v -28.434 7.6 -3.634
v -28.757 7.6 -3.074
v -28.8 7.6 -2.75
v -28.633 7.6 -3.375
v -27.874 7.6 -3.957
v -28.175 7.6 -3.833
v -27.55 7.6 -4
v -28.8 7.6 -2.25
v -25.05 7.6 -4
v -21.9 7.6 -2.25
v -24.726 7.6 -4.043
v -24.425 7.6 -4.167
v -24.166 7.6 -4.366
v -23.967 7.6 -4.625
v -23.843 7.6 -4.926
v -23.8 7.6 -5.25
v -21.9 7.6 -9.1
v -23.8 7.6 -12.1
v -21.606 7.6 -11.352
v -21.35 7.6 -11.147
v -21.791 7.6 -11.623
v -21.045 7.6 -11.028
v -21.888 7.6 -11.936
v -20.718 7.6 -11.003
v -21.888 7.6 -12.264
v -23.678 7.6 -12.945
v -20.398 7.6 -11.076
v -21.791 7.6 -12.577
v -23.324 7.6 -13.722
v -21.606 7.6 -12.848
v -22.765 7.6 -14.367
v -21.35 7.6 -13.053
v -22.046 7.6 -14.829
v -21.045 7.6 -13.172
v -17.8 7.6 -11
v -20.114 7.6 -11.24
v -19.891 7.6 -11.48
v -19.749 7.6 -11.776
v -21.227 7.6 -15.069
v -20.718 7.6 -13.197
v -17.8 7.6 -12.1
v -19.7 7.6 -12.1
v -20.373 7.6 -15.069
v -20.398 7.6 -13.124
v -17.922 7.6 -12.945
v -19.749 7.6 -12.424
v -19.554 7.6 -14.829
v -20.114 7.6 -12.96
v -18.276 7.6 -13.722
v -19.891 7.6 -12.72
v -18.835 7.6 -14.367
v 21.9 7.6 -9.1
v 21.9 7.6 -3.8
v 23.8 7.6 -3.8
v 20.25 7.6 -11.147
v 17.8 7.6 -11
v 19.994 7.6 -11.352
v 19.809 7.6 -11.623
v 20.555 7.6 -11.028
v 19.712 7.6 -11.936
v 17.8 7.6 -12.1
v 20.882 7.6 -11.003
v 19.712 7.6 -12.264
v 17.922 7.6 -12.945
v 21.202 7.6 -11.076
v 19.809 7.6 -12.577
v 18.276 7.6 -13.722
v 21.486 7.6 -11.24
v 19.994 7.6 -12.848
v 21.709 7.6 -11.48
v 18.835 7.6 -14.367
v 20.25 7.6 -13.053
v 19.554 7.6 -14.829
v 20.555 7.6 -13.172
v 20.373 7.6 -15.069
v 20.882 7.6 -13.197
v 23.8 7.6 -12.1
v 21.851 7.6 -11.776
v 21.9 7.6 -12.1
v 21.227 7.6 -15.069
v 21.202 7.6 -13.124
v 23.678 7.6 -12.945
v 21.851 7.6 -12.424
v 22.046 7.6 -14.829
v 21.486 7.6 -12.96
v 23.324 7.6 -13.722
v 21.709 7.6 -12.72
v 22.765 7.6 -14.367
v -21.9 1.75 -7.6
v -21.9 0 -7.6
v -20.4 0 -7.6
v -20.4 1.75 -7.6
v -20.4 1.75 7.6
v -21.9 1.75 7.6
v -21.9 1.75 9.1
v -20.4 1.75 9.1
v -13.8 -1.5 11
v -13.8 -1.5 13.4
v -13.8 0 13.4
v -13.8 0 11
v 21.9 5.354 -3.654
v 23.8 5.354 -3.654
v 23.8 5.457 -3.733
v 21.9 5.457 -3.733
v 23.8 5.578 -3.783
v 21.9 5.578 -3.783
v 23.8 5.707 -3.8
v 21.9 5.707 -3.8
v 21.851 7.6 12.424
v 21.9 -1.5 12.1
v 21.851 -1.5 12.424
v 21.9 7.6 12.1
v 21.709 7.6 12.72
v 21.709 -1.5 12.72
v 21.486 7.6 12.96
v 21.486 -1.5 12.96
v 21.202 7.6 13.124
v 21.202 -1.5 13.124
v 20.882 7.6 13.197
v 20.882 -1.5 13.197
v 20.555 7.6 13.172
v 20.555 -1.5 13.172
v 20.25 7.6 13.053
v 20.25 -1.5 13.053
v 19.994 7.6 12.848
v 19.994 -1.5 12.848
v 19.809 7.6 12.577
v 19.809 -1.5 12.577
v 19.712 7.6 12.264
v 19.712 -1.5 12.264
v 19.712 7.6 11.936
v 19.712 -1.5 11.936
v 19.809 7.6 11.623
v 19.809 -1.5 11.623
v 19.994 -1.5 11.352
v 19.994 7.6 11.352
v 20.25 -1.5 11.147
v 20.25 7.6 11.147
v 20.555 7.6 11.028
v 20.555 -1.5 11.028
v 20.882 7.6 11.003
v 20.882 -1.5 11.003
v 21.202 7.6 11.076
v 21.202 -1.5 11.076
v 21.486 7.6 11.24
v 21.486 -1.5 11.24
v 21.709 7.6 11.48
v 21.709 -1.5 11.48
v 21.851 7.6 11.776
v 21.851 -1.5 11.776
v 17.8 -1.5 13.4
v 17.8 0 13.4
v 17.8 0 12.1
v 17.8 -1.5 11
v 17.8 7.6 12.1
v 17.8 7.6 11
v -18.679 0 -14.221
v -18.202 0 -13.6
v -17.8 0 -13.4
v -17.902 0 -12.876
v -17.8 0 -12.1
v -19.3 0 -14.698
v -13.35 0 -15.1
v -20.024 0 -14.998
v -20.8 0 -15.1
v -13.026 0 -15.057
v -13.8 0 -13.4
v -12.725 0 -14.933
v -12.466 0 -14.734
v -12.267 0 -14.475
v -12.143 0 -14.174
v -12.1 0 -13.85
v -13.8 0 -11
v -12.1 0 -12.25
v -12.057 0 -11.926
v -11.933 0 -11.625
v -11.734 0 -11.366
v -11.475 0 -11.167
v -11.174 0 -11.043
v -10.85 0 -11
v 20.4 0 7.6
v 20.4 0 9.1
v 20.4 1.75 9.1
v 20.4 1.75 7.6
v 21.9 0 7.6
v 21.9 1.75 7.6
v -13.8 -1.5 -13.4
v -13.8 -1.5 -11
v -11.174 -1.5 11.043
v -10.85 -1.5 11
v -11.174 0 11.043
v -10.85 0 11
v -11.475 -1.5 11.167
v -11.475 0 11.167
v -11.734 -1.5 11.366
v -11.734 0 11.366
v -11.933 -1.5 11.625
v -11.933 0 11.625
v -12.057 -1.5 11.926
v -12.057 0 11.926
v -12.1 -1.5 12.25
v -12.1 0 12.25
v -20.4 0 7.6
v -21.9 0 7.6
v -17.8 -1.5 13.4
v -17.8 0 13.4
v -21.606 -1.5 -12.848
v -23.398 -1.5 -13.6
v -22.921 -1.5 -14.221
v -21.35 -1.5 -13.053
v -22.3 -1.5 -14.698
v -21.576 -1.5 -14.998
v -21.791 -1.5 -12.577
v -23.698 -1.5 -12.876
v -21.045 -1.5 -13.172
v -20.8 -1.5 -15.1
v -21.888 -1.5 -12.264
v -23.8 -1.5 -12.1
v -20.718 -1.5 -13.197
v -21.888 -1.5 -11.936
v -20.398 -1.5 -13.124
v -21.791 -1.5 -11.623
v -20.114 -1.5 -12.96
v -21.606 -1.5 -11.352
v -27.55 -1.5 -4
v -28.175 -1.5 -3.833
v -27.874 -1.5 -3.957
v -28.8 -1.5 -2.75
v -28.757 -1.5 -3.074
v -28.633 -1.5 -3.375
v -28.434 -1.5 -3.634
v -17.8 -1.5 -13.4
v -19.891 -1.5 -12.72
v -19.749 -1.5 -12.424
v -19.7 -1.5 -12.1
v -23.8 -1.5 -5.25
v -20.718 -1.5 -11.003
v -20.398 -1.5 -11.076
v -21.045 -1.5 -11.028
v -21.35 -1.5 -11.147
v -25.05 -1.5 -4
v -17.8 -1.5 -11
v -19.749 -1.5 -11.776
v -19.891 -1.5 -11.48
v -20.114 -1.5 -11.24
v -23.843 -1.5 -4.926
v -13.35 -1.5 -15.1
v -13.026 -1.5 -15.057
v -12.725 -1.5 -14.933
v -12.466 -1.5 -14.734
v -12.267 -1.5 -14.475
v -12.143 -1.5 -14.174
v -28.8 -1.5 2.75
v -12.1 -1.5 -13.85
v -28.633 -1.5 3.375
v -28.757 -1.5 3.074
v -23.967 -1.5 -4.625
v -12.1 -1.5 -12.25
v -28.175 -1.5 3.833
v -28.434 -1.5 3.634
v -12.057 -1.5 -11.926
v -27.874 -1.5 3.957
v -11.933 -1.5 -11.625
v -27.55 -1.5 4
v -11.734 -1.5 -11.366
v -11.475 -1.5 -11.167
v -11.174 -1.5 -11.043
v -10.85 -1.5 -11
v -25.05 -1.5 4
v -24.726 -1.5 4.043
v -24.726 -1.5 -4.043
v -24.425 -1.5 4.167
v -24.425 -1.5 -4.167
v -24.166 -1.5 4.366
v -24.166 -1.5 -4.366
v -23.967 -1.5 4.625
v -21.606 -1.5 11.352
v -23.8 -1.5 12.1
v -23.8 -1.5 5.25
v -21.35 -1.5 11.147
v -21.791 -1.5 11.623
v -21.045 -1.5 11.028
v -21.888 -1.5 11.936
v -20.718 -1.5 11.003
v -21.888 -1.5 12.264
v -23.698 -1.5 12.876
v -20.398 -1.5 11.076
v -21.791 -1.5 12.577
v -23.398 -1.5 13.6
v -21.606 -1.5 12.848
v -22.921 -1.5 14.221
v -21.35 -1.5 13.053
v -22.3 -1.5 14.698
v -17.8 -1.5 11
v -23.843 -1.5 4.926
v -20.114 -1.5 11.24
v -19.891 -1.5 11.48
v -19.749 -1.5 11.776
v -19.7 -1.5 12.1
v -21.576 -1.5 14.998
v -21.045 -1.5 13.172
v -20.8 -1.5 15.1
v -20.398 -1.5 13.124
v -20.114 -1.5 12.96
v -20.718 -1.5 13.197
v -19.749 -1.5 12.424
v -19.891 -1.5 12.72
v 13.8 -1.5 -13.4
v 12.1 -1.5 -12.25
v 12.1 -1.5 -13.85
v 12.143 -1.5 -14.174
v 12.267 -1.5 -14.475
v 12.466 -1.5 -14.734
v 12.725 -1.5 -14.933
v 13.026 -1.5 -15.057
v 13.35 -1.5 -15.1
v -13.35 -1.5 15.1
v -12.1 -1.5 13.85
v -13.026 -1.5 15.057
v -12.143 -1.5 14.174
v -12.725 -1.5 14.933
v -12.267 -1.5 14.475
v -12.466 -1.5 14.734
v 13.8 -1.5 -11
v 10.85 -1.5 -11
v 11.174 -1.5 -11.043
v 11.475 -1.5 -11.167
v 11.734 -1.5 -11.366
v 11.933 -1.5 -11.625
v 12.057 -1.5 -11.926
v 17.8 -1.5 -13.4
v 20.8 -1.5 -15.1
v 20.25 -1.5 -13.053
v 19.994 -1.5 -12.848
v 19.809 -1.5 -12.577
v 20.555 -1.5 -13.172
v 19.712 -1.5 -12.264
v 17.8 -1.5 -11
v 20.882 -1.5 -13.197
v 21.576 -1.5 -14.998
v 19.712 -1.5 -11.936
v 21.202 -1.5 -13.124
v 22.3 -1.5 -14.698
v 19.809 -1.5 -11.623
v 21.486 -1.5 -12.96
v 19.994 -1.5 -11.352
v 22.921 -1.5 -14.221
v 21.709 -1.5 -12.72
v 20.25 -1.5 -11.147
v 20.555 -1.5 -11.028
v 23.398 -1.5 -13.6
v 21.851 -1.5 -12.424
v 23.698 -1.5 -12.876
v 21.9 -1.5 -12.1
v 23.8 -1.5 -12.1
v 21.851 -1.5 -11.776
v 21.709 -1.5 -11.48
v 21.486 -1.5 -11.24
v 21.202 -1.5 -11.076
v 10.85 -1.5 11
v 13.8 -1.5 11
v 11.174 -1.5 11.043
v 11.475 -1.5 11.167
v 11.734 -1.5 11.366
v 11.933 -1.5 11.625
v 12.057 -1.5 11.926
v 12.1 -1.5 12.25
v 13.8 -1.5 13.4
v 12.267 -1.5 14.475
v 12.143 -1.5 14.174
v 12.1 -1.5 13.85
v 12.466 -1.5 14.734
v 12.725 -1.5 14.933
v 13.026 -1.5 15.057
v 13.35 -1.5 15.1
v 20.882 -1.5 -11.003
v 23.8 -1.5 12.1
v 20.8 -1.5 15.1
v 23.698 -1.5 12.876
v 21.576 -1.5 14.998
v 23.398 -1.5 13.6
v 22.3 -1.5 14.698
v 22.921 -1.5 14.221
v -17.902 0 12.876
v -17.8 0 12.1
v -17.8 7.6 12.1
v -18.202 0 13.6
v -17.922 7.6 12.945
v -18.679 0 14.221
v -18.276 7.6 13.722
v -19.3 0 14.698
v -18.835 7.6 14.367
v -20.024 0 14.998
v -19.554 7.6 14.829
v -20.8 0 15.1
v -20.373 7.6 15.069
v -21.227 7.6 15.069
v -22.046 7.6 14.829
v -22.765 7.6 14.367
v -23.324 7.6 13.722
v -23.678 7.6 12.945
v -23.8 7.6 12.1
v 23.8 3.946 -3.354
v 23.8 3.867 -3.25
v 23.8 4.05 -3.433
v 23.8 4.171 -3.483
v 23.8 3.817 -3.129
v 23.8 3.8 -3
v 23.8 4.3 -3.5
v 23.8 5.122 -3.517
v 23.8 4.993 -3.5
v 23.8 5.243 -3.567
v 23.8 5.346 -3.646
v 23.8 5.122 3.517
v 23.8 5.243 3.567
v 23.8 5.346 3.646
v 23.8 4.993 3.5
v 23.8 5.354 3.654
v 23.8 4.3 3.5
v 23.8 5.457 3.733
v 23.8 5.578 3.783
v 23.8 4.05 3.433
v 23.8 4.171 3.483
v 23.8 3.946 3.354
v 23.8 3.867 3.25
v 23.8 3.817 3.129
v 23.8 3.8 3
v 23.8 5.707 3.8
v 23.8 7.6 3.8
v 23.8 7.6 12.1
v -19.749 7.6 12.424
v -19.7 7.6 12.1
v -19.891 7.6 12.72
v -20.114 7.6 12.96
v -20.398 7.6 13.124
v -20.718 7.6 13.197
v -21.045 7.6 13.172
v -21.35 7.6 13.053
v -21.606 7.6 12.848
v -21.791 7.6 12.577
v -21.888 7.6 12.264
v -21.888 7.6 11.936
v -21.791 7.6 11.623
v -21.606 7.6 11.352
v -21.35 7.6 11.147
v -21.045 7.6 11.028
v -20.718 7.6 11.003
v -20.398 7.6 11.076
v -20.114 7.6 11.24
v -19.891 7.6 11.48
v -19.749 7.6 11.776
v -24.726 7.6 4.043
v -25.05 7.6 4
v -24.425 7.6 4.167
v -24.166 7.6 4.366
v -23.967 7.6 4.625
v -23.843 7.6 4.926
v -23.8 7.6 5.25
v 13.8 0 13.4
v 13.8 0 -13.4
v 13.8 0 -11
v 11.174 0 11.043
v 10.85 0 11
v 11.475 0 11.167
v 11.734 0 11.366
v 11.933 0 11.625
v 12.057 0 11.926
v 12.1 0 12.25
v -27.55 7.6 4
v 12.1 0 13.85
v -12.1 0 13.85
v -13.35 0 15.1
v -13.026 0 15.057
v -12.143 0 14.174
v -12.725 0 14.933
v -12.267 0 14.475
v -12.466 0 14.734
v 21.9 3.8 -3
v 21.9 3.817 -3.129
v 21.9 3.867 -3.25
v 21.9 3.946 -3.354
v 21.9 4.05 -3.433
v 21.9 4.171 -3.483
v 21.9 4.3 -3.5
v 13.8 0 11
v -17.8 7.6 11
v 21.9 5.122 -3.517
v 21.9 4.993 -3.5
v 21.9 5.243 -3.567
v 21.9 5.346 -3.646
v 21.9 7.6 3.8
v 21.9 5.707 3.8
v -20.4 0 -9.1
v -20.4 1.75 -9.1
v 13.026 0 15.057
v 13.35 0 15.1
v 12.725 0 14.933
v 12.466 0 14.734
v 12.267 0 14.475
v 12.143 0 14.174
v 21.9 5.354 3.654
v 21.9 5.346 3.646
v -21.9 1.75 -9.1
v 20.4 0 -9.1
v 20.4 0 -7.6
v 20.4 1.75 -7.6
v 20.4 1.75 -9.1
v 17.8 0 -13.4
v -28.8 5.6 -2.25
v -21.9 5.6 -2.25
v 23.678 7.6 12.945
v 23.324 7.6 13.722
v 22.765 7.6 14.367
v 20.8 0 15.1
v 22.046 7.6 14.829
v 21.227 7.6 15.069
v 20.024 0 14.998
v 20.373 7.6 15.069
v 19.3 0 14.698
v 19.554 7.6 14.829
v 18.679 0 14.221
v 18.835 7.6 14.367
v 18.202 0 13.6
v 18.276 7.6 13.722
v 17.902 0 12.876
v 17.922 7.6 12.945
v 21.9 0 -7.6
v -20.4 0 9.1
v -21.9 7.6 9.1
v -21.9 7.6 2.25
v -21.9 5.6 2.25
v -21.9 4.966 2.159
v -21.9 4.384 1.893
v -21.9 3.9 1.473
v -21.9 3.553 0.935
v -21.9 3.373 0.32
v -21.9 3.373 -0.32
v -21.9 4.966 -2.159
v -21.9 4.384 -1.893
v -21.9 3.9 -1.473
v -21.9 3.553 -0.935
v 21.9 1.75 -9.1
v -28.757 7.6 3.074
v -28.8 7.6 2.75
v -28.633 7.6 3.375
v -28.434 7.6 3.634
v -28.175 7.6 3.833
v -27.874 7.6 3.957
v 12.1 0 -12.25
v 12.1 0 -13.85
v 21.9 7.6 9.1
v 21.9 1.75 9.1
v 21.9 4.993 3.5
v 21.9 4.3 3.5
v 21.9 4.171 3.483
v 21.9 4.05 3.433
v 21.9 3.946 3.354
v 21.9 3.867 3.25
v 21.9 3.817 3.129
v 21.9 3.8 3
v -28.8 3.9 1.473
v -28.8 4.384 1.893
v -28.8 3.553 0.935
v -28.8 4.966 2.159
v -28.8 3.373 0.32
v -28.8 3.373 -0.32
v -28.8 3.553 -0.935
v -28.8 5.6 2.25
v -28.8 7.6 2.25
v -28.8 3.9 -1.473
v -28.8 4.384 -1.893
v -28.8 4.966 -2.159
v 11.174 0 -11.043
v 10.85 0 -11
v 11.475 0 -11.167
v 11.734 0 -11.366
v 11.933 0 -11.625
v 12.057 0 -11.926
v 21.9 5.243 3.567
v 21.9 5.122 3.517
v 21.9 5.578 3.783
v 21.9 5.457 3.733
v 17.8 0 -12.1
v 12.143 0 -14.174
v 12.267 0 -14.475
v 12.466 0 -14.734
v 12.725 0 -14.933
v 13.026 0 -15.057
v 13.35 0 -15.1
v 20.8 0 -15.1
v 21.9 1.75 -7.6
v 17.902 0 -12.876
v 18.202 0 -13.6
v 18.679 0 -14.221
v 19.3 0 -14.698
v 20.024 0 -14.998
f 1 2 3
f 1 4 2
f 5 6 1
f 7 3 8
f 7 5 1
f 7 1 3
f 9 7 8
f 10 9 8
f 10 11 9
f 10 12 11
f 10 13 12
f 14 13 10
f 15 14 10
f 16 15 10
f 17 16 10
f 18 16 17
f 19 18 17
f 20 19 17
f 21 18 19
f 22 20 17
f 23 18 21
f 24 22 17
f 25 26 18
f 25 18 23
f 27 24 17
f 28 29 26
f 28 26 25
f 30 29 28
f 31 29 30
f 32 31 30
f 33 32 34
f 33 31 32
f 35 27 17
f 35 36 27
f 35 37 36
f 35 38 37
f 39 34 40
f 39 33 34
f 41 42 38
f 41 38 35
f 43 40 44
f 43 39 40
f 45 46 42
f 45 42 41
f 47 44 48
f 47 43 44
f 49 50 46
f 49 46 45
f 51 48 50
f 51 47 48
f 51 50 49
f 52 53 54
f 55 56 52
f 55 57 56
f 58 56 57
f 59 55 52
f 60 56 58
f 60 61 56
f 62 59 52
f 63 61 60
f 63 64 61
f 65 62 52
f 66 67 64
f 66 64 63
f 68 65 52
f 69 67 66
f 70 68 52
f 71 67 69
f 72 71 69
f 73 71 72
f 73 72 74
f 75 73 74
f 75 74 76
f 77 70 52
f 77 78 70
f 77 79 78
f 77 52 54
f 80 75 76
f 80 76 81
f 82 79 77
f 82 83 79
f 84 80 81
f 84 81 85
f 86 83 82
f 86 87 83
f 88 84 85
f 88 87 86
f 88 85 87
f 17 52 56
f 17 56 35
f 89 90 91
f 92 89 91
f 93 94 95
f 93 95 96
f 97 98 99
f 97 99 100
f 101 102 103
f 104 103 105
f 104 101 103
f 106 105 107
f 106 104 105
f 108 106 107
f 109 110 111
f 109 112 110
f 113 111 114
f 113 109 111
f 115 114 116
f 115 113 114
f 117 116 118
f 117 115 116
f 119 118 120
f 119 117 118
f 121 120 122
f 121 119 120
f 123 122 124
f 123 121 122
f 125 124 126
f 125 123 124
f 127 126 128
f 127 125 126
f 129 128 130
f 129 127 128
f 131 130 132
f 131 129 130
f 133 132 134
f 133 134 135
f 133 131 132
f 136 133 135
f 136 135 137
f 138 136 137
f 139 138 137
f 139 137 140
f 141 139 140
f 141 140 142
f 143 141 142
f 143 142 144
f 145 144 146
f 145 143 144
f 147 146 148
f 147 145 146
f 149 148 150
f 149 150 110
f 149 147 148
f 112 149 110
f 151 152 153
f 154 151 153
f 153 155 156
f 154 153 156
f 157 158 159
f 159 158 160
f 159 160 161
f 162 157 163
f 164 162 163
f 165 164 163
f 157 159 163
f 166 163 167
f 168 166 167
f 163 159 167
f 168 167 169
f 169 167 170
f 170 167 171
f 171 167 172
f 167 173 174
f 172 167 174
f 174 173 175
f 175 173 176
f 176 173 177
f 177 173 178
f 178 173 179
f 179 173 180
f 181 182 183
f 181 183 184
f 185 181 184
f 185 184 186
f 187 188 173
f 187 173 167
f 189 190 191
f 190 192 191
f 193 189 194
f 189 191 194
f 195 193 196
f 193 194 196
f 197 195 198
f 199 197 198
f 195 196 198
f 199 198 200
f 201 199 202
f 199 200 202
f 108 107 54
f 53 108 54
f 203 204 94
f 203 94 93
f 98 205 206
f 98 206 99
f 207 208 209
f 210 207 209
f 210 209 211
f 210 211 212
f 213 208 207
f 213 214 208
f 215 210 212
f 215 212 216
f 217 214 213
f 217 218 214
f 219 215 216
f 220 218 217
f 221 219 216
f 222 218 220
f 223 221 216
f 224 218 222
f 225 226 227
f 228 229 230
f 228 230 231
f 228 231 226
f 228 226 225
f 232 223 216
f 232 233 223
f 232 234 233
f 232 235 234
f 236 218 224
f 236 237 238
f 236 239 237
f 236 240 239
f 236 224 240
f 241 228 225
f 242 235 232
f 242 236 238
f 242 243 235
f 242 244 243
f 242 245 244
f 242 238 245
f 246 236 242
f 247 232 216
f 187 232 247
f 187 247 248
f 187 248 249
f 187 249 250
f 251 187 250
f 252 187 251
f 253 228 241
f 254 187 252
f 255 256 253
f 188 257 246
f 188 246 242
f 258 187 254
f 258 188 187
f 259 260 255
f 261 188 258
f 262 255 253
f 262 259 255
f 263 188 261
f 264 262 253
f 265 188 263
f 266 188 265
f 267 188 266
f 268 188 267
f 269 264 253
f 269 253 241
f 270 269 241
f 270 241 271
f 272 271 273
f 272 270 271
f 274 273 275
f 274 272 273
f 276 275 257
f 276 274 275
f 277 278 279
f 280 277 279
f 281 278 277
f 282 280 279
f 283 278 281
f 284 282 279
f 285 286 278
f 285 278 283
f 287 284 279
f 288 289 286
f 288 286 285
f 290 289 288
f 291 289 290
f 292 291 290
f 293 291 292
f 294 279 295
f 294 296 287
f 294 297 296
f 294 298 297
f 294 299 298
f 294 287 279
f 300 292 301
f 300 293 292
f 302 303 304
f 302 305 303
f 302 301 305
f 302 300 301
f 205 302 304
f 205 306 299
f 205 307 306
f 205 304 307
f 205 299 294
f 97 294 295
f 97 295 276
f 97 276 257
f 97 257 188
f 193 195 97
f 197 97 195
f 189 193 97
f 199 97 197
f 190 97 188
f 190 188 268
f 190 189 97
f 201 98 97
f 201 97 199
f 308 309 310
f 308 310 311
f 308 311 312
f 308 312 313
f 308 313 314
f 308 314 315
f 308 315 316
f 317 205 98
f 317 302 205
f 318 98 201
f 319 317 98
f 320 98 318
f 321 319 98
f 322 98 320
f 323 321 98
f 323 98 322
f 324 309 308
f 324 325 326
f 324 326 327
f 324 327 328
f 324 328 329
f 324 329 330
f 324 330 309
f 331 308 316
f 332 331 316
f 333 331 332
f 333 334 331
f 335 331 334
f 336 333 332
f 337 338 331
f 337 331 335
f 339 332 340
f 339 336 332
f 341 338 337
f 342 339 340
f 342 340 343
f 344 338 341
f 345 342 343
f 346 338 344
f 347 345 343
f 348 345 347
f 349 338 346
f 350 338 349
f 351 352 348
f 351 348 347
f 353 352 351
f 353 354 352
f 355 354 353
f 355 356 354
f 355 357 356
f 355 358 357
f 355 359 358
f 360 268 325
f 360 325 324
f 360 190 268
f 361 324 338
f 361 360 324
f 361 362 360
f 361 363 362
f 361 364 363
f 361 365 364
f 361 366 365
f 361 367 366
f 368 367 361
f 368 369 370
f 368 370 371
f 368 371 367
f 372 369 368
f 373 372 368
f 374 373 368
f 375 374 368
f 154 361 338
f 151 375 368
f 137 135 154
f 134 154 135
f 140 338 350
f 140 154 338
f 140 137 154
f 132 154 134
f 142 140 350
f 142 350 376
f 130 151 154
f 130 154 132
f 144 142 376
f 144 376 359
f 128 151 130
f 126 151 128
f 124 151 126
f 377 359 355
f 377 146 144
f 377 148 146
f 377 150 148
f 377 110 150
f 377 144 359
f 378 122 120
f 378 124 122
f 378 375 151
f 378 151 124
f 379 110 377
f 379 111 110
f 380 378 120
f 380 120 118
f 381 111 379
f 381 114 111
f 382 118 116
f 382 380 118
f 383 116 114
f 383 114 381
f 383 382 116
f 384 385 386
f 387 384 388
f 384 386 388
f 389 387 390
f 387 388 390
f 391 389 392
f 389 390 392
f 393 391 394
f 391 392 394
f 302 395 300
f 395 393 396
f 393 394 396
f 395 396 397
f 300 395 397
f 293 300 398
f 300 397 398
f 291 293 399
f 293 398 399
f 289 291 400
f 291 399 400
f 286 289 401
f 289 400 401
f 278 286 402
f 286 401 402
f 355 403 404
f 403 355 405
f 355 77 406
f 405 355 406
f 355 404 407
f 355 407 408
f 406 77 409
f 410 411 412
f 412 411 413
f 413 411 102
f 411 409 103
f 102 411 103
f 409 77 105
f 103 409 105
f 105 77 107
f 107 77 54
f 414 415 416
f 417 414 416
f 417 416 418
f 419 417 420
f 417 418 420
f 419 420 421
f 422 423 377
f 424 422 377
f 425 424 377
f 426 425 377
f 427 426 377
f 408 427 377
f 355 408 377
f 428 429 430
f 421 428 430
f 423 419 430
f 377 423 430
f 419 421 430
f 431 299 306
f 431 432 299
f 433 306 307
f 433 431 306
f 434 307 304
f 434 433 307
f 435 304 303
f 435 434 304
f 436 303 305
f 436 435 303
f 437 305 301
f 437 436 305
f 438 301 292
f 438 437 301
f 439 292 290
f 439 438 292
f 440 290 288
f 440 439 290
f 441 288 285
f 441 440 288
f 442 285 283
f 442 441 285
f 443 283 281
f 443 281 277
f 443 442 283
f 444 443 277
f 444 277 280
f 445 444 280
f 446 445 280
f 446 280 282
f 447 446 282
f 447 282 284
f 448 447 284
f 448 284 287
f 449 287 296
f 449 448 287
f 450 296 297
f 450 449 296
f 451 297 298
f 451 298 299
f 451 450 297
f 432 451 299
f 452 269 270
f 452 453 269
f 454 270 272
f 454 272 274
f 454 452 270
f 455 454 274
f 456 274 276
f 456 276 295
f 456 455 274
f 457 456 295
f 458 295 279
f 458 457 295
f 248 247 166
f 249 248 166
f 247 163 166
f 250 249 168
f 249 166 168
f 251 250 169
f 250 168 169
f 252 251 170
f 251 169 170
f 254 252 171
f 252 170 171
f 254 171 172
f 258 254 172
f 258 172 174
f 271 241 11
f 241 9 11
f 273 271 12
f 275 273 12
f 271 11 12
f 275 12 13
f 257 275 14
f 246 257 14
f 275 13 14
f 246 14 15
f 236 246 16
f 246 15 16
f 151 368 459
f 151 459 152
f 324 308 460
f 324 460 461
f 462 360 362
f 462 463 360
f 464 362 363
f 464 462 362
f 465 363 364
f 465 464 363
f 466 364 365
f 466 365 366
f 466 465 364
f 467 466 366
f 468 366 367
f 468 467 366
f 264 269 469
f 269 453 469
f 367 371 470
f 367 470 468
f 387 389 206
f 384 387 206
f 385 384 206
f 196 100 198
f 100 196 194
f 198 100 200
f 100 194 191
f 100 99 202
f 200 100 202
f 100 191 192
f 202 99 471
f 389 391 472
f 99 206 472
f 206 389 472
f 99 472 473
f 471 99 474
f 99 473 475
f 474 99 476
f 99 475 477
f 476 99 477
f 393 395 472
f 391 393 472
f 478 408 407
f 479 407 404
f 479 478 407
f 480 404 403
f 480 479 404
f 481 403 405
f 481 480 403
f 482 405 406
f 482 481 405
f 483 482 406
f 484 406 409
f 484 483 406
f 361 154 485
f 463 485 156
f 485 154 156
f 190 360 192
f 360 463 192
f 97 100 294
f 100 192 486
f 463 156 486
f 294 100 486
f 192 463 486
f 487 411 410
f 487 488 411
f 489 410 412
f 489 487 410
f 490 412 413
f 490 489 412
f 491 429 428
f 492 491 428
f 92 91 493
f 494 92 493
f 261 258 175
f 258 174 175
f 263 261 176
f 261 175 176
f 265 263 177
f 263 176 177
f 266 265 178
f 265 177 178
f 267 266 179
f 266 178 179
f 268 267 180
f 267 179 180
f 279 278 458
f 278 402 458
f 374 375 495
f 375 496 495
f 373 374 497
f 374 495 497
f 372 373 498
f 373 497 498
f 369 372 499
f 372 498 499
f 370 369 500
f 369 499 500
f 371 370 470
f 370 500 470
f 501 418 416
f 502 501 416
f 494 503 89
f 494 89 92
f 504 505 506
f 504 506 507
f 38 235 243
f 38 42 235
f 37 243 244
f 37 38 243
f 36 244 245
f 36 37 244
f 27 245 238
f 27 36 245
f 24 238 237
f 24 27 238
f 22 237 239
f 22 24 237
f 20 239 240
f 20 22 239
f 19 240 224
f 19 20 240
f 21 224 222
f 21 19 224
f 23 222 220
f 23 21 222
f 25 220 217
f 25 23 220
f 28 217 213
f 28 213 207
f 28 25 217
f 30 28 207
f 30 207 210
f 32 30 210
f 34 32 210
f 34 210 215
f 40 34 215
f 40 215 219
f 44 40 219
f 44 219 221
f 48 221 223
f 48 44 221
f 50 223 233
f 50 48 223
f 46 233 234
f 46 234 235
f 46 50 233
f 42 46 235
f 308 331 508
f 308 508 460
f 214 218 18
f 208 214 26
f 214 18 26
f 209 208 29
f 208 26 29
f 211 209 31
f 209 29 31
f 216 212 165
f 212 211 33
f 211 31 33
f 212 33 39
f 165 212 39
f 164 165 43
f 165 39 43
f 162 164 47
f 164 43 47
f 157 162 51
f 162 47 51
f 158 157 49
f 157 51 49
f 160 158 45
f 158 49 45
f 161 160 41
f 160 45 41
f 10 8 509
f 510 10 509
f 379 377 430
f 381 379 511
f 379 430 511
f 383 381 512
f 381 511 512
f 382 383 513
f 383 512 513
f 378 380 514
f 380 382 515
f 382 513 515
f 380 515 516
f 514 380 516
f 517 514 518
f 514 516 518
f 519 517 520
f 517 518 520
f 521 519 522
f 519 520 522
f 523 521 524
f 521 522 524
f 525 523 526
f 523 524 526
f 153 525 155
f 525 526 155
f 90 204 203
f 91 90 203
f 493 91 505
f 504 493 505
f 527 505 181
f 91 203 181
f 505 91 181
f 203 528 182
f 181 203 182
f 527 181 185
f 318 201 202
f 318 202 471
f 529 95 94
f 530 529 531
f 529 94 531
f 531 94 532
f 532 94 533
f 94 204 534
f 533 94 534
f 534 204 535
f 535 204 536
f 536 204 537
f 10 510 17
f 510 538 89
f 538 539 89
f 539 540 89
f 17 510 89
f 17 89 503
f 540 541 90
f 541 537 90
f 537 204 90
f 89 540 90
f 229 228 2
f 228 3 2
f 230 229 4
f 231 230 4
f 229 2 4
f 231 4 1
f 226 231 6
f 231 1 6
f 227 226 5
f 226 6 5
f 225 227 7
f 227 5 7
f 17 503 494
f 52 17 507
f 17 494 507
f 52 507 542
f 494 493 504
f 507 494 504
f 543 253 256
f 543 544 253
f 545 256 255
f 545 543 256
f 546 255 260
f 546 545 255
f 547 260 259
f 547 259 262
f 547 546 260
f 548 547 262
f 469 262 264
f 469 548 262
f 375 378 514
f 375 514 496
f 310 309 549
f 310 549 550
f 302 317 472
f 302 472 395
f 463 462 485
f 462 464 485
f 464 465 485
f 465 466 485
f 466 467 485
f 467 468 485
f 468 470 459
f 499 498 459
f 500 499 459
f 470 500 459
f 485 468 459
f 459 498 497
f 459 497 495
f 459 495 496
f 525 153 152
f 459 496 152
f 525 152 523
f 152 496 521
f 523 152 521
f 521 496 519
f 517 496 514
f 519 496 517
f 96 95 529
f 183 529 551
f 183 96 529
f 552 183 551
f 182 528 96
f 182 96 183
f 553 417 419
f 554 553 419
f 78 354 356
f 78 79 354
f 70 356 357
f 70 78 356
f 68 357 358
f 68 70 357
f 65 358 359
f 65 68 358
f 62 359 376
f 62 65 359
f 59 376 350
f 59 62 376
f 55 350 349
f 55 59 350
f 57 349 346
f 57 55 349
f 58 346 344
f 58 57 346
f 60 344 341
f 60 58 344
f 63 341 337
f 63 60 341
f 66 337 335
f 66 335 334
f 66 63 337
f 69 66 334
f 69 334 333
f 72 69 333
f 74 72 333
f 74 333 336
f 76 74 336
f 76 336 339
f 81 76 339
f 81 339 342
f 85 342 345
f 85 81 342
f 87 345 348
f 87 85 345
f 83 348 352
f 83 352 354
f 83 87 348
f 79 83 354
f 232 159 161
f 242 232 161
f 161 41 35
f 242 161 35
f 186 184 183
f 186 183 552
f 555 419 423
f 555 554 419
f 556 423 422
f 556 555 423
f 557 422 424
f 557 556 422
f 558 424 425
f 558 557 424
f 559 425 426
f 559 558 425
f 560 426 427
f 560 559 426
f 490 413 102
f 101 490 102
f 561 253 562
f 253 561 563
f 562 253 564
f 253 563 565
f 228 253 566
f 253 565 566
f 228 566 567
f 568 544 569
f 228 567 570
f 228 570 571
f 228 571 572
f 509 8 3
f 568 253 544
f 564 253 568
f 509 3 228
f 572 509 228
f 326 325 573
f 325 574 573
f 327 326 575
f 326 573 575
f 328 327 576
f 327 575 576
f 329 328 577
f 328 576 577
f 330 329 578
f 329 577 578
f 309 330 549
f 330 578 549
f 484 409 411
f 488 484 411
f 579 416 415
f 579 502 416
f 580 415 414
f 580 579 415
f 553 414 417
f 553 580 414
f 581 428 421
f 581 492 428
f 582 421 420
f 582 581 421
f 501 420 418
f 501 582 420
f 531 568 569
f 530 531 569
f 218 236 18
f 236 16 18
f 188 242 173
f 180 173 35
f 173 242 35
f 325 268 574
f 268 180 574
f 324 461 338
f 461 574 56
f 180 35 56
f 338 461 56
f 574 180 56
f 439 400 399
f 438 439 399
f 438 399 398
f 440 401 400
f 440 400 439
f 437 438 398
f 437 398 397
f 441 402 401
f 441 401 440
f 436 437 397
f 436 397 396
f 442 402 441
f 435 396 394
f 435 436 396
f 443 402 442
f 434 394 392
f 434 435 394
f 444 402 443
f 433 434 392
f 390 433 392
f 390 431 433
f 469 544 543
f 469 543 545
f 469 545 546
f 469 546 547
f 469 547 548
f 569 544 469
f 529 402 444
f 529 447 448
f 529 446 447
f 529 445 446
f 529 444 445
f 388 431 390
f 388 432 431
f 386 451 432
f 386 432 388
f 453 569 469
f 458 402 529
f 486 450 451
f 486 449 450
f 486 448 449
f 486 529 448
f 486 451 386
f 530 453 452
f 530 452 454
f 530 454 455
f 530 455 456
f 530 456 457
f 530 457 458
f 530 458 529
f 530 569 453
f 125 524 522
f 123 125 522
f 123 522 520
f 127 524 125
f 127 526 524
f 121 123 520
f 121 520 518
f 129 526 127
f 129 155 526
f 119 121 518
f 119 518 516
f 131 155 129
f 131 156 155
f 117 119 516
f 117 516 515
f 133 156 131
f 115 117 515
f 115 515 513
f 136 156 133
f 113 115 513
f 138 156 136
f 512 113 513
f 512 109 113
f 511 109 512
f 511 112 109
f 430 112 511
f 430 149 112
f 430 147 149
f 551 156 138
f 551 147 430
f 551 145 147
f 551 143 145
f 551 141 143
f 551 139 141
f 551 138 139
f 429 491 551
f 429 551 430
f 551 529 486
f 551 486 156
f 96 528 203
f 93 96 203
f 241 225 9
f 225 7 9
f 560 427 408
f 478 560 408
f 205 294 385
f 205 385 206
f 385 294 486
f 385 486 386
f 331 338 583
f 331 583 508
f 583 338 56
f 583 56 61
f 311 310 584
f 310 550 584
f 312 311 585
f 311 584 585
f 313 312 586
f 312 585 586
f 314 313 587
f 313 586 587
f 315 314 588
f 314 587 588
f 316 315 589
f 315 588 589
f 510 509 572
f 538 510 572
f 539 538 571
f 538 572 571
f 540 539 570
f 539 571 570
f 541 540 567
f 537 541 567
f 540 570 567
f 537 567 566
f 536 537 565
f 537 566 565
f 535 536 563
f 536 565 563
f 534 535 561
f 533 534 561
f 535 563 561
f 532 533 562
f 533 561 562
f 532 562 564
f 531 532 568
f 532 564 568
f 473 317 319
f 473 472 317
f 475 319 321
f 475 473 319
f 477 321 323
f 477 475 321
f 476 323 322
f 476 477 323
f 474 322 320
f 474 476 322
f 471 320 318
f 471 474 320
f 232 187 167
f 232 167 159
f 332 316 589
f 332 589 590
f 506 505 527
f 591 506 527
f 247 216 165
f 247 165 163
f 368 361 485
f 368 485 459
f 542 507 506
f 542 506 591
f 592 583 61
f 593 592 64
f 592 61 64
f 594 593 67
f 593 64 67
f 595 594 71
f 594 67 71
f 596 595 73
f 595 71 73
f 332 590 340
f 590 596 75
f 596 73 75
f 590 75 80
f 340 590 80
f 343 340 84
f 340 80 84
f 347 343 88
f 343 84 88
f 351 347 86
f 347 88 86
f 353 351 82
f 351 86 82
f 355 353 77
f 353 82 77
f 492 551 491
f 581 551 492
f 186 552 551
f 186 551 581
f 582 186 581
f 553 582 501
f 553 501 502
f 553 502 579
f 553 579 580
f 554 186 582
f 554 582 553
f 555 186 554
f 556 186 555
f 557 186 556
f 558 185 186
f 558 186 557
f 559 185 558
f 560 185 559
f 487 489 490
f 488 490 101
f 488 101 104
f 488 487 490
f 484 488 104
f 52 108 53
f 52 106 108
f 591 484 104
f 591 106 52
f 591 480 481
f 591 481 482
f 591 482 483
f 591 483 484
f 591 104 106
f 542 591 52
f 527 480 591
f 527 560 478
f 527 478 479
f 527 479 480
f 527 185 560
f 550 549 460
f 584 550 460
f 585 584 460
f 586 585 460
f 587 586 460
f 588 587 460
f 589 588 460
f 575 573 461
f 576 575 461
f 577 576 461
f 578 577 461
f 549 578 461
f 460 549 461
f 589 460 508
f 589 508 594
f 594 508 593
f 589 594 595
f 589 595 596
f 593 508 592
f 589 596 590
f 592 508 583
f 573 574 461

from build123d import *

# Parameters (mm, degrees)
SKETCH1_W           = 43.8
SKETCH1_H           = 18.2
SKETCH1_R           = 1.1
BOSS_EXTRUDE1_DEPTH = 7.6
SKETCH3_R           = 1.1
BOSS_EXTRUDE2_DEPTH = 1.5
CUT_EXTRUDE1_REACH  = 54.6
SKETCH5_W           = 1.5
SKETCH5_H           = 1.5
BOSS_EXTRUDE3_DEPTH = 1.75
CUT_EXTRUDE2_REACH  = 54.6
BOSS_EXTRUDE4_DEPTH = 1.5
FILLET1_R           = 1.25
FILLET2_R           = 0.5


with BuildPart() as part:
    # Sketch1 → Boss-Extrude1 (new body)
    with BuildSketch(Plane(origin=(0, 0, 0), x_dir=(1, 0, 0), z_dir=(0, 1, 0))):
        with BuildLine():
            ThreePointArc((-23.8, -12.1), (-20.8, -15.1), (-17.8, -12.1))
            Line((-17.8, -12.1), (-17.8, -11))
            Line((-17.8, -11), (17.8, -11))
            Line((17.8, -11), (17.8, -12.1))
            ThreePointArc((17.8, -12.1), (20.8, -15.1), (23.8, -12.1))
            Line((23.8, -12.1), (23.8, 12.1))
            ThreePointArc((23.8, 12.1), (20.8, 15.1), (17.8, 12.1))
            Line((17.8, 12.1), (17.8, 11))
            Line((17.8, 11), (-17.8, 11))
            Line((-17.8, 11), (-17.8, 12.1))
            ThreePointArc((-17.8, 12.1), (-20.8, 15.1), (-23.8, 12.1))
            Line((-23.8, 12.1), (-23.8, 4))
            Line((-23.8, 4), (-28.8, 4))
            Line((-28.8, 4), (-28.8, -4))
            Line((-28.8, -4), (-23.8, -4))
            Line((-23.8, -4), (-23.8, -12.1))
        make_face()
        Rectangle(SKETCH1_W, SKETCH1_H, mode=Mode.SUBTRACT)
        with Locations((-20.8, 12.1)):
            Circle(SKETCH1_R, mode=Mode.SUBTRACT)
        with Locations((20.8, 12.1)):
            Circle(SKETCH1_R, mode=Mode.SUBTRACT)
        with Locations((-20.8, -12.1)):
            Circle(SKETCH1_R, mode=Mode.SUBTRACT)
        with Locations((20.8, -12.1)):
            Circle(SKETCH1_R, mode=Mode.SUBTRACT)
    extrude(amount=BOSS_EXTRUDE1_DEPTH)

    # Sketch3 → Boss-Extrude2 (add)
    with BuildSketch(Plane.XZ):
        with BuildLine():
            Line((-23.8, -4), (-23.8, -12.1))
            ThreePointArc((-23.8, -12.1), (-20.8, -15.1), (-17.8, -12.1))
            Line((-17.8, -12.1), (-17.8, -11))
            Line((-17.8, -11), (17.8, -11))
            Line((17.8, -11), (17.8, -12.1))
            ThreePointArc((17.8, -12.1), (20.8, -15.1), (23.8, -12.1))
            Line((23.8, -12.1), (23.8, 12.1))
            ThreePointArc((23.8, 12.1), (20.8, 15.1), (17.8, 12.1))
            Line((17.8, 12.1), (17.8, 11))
            Line((17.8, 11), (-17.8, 11))
            Line((-17.8, 11), (-17.8, 12.1))
            ThreePointArc((-17.8, 12.1), (-20.8, 15.1), (-23.8, 12.1))
            Line((-23.8, 12.1), (-23.8, 4))
            Line((-23.8, 4), (-28.8, 4))
            Line((-28.8, 4), (-28.8, -4))
            Line((-28.8, -4), (-23.8, -4))
        make_face()
        with Locations((-20.8, -12.1)):
            Circle(SKETCH3_R, mode=Mode.SUBTRACT)
        with Locations((20.8, -12.1)):
            Circle(SKETCH3_R, mode=Mode.SUBTRACT)
        with Locations((20.8, 12.1)):
            Circle(SKETCH3_R, mode=Mode.SUBTRACT)
        with Locations((-20.8, 12.1)):
            Circle(SKETCH3_R, mode=Mode.SUBTRACT)
    extrude(amount=BOSS_EXTRUDE2_DEPTH)

    # Sketch4 → Cut-Extrude1 (cut, up to next)
    with BuildSketch(Plane.ZY.offset(28.8), mode=Mode.PRIVATE) as cut_extrude1_sk1:
        with BuildLine():
            Line((-2.25, 7.6), (-2.25, 5.6))
            ThreePointArc((-2.25, 5.6), (0, 3.35), (2.25, 5.6))
            Line((2.25, 5.6), (2.25, 7.6))
            Line((2.25, 7.6), (-2.25, 7.6))
        make_face()
    cut_extrude1_tool1 = extrude(cut_extrude1_sk1.sketch, amount=-CUT_EXTRUDE1_REACH, mode=Mode.PRIVATE) & part.part
    add(cut_extrude1_tool1.solids().sort_by_distance((-28.8, 5.682954, 0))[0], mode=Mode.SUBTRACT)

    # Sketch5 → Boss-Extrude3 (add)
    with BuildSketch(Plane(origin=(0, 0, 0), x_dir=(1, 0, 0), z_dir=(0, 1, 0))):
        with Locations((-21.15, 8.35)):
            Rectangle(SKETCH5_W, SKETCH5_H)
        with Locations((21.15, 8.35)):
            Rectangle(SKETCH5_W, SKETCH5_H)
        with Locations((-21.15, -8.35)):
            Rectangle(SKETCH5_W, SKETCH5_H)
        with Locations((21.15, -8.35)):
            Rectangle(SKETCH5_W, SKETCH5_H)
    extrude(amount=BOSS_EXTRUDE3_DEPTH)

    # Sketch6 → Cut-Extrude2 (cut, up to next)
    with BuildSketch(Plane(origin=(23.8, 0, 0), x_dir=(0, 0, -1), z_dir=(1, 0, 0)), mode=Mode.PRIVATE) as cut_extrude2_sk1:
        Polygon((3.8, 7.6), (-3.8, 7.6), (-3.8, 5.5), (-3.5, 5.2), (-3.5, 3.8), (3.5, 3.8), (3.5, 5.2), (3.8, 5.5), align=None)
    cut_extrude2_tool1 = extrude(cut_extrude2_sk1.sketch, amount=-CUT_EXTRUDE2_REACH, mode=Mode.PRIVATE) & part.part
    add(cut_extrude2_tool1.solids().sort_by_distance((23.8, 5.737352, 0))[0], mode=Mode.SUBTRACT)

    # Sketch8 → Boss-Extrude4 (add)
    with BuildSketch(Plane.XZ.offset(1.5)):
        with BuildLine():
            Line((-12.1, 15.1), (-20.8, 15.1))
            ThreePointArc((-20.8, 15.1), (-18.678679656, 14.221320344), (-17.8, 12.1))
            Line((-17.8, 12.1), (-17.8, 13.4))
            Line((-17.8, 13.4), (-13.8, 13.4))
            Line((-13.8, 13.4), (-13.8, 11))
            Line((-13.8, 11), (-12.1, 11))
            Line((-12.1, 11), (-12.1, 15.1))
        make_face()
        with BuildLine():
            Line((12.1, 15.1), (12.1, 11))
            Line((12.1, 11), (13.8, 11))
            Line((13.8, 11), (13.8, 13.4))
            Line((13.8, 13.4), (17.8, 13.4))
            Line((17.8, 13.4), (17.8, 12.1))
            ThreePointArc((17.8, 12.1), (18.678679656, 14.221320344), (20.8, 15.1))
            Line((20.8, 15.1), (12.1, 15.1))
        make_face()
        with BuildLine():
            Line((13.8, -11), (12.1, -11))
            Line((12.1, -11), (12.1, -15.1))
            Line((12.1, -15.1), (20.8, -15.1))
            ThreePointArc((20.8, -15.1), (18.678679656, -14.221320344), (17.8, -12.1))
            Line((17.8, -12.1), (17.8, -13.4))
            Line((17.8, -13.4), (13.8, -13.4))
            Line((13.8, -13.4), (13.8, -11))
        make_face()
        with BuildLine():
            Line((-20.8, -15.1), (-12.1, -15.1))
            Line((-12.1, -15.1), (-12.1, -11))
            Line((-12.1, -11), (-13.8, -11))
            Line((-13.8, -11), (-13.8, -13.4))
            Line((-13.8, -13.4), (-17.8, -13.4))
            Line((-17.8, -13.4), (-17.8, -12.1))
            ThreePointArc((-17.8, -12.1), (-18.678679656, -14.221320344), (-20.8, -15.1))
        make_face()
    extrude(amount=-BOSS_EXTRUDE4_DEPTH)

    # Fillet1
    fillet1_edges = [part.edges().sort_by_distance(p)[0] for p in [
        (-12.1, -0.75, 15.1),
        (-12.1, -0.75, 11),
        (12.1, -0.75, 11),
        (12.1, -0.75, 15.1),
        (12.1, -0.75, -15.1),
        (12.1, -0.75, -11),
        (-12.1, -0.75, -11),
        (-12.1, -0.75, -15.1),
        (-23.8, 3.05, 4),
        (-28.8, 3.05, 4),
        (-28.8, 3.05, -4),
        (-23.8, 3.05, -4),
    ]]
    fillet(fillet1_edges, radius=FILLET1_R)

    # Fillet2
    fillet2_edges = [part.edges().sort_by_distance(p)[0] for p in [
        (22.85, 5.2, -3.5),
        (22.85, 3.8, -3.5),
        (22.85, 3.8, 3.5),
        (22.85, 5.2, 3.5),
        (22.85, 5.5, 3.8),
        (22.85, 5.5, -3.8),
    ]]
    fillet(fillet2_edges, radius=FILLET2_R)


solid = part.part
